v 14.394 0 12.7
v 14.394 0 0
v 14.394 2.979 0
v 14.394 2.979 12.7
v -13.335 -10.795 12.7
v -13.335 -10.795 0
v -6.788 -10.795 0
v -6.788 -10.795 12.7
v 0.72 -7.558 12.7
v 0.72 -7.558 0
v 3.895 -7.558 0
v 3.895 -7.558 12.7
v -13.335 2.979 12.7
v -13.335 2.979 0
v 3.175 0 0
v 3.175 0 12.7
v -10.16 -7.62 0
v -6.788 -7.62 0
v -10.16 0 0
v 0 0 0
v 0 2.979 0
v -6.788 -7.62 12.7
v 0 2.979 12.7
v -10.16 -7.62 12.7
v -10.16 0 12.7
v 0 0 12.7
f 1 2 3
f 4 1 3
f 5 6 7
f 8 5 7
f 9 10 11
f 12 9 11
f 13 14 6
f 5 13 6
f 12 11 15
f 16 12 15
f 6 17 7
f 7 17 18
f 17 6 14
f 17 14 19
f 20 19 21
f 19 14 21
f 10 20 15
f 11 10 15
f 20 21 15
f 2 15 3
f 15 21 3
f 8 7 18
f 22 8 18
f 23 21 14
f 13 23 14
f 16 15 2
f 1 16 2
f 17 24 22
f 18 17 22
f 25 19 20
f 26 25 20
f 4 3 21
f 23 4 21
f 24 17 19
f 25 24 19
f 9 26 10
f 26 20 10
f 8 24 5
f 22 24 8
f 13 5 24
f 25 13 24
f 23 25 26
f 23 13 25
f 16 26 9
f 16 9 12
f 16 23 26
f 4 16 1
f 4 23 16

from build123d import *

# Parameters (mm, degrees)
F0_W     = 3.175
F0_H     = 2.978667
F0_W_2   = 10.16
F0_H_2   = 7.62
F0_H_3   = 3.175
F0_W_3   = 3.372148
F1_DEPTH = 12.7
F2_W     = 6.884132
F2_H     = 8.857906
F3_DEPTH = 25.4


with BuildPart() as f1:
    # F0 (on Top) → F1 (new body)
    with BuildSketch(Plane.XY):
        with Locations((-11.7475, 1.489333)):
            Rectangle(F0_W, F0_H)
        with Locations((-5.08, 1.489333)):
            Rectangle(F0_W_2, F0_H)
        with Locations((-11.7475, -3.81)):
            Rectangle(F0_W, F0_H_2)
        Polygon((2.891317, 2.978667), (0, 2.978667), (0, 0), (3.175, 0), align=None)
        with Locations((-11.7475, -9.2075)):
            Rectangle(F0_W, F0_H_3)
        with Locations((-8.473926, -9.2075)):
            Rectangle(F0_W_3, F0_H_3)
        Polygon((3.175, 0), (0, 0), (1.27, -13.335), (1.27, -10.16), (4.142619, -10.16), align=None)
        Polygon((14.394098, 2.978667), (2.891317, 2.978667), (3.175, 0), (14.394098, 0), align=None)
        Polygon((1.27, -10.16), (1.27, -13.335), (4.445, -13.335), (4.142619, -10.16), align=None)
        Polygon((4.445, -10.16), (4.142619, -10.16), (4.445, -13.335), align=None)
    extrude(amount=F1_DEPTH)

    # F2 (on Top) → F3 (cut)
    with BuildSketch(Plane.XY):
        with Locations((3.442066, -11.987058)):
            Rectangle(F2_W, F2_H)
    extrude(amount=F3_DEPTH, mode=Mode.SUBTRACT)


solid = f1.part
